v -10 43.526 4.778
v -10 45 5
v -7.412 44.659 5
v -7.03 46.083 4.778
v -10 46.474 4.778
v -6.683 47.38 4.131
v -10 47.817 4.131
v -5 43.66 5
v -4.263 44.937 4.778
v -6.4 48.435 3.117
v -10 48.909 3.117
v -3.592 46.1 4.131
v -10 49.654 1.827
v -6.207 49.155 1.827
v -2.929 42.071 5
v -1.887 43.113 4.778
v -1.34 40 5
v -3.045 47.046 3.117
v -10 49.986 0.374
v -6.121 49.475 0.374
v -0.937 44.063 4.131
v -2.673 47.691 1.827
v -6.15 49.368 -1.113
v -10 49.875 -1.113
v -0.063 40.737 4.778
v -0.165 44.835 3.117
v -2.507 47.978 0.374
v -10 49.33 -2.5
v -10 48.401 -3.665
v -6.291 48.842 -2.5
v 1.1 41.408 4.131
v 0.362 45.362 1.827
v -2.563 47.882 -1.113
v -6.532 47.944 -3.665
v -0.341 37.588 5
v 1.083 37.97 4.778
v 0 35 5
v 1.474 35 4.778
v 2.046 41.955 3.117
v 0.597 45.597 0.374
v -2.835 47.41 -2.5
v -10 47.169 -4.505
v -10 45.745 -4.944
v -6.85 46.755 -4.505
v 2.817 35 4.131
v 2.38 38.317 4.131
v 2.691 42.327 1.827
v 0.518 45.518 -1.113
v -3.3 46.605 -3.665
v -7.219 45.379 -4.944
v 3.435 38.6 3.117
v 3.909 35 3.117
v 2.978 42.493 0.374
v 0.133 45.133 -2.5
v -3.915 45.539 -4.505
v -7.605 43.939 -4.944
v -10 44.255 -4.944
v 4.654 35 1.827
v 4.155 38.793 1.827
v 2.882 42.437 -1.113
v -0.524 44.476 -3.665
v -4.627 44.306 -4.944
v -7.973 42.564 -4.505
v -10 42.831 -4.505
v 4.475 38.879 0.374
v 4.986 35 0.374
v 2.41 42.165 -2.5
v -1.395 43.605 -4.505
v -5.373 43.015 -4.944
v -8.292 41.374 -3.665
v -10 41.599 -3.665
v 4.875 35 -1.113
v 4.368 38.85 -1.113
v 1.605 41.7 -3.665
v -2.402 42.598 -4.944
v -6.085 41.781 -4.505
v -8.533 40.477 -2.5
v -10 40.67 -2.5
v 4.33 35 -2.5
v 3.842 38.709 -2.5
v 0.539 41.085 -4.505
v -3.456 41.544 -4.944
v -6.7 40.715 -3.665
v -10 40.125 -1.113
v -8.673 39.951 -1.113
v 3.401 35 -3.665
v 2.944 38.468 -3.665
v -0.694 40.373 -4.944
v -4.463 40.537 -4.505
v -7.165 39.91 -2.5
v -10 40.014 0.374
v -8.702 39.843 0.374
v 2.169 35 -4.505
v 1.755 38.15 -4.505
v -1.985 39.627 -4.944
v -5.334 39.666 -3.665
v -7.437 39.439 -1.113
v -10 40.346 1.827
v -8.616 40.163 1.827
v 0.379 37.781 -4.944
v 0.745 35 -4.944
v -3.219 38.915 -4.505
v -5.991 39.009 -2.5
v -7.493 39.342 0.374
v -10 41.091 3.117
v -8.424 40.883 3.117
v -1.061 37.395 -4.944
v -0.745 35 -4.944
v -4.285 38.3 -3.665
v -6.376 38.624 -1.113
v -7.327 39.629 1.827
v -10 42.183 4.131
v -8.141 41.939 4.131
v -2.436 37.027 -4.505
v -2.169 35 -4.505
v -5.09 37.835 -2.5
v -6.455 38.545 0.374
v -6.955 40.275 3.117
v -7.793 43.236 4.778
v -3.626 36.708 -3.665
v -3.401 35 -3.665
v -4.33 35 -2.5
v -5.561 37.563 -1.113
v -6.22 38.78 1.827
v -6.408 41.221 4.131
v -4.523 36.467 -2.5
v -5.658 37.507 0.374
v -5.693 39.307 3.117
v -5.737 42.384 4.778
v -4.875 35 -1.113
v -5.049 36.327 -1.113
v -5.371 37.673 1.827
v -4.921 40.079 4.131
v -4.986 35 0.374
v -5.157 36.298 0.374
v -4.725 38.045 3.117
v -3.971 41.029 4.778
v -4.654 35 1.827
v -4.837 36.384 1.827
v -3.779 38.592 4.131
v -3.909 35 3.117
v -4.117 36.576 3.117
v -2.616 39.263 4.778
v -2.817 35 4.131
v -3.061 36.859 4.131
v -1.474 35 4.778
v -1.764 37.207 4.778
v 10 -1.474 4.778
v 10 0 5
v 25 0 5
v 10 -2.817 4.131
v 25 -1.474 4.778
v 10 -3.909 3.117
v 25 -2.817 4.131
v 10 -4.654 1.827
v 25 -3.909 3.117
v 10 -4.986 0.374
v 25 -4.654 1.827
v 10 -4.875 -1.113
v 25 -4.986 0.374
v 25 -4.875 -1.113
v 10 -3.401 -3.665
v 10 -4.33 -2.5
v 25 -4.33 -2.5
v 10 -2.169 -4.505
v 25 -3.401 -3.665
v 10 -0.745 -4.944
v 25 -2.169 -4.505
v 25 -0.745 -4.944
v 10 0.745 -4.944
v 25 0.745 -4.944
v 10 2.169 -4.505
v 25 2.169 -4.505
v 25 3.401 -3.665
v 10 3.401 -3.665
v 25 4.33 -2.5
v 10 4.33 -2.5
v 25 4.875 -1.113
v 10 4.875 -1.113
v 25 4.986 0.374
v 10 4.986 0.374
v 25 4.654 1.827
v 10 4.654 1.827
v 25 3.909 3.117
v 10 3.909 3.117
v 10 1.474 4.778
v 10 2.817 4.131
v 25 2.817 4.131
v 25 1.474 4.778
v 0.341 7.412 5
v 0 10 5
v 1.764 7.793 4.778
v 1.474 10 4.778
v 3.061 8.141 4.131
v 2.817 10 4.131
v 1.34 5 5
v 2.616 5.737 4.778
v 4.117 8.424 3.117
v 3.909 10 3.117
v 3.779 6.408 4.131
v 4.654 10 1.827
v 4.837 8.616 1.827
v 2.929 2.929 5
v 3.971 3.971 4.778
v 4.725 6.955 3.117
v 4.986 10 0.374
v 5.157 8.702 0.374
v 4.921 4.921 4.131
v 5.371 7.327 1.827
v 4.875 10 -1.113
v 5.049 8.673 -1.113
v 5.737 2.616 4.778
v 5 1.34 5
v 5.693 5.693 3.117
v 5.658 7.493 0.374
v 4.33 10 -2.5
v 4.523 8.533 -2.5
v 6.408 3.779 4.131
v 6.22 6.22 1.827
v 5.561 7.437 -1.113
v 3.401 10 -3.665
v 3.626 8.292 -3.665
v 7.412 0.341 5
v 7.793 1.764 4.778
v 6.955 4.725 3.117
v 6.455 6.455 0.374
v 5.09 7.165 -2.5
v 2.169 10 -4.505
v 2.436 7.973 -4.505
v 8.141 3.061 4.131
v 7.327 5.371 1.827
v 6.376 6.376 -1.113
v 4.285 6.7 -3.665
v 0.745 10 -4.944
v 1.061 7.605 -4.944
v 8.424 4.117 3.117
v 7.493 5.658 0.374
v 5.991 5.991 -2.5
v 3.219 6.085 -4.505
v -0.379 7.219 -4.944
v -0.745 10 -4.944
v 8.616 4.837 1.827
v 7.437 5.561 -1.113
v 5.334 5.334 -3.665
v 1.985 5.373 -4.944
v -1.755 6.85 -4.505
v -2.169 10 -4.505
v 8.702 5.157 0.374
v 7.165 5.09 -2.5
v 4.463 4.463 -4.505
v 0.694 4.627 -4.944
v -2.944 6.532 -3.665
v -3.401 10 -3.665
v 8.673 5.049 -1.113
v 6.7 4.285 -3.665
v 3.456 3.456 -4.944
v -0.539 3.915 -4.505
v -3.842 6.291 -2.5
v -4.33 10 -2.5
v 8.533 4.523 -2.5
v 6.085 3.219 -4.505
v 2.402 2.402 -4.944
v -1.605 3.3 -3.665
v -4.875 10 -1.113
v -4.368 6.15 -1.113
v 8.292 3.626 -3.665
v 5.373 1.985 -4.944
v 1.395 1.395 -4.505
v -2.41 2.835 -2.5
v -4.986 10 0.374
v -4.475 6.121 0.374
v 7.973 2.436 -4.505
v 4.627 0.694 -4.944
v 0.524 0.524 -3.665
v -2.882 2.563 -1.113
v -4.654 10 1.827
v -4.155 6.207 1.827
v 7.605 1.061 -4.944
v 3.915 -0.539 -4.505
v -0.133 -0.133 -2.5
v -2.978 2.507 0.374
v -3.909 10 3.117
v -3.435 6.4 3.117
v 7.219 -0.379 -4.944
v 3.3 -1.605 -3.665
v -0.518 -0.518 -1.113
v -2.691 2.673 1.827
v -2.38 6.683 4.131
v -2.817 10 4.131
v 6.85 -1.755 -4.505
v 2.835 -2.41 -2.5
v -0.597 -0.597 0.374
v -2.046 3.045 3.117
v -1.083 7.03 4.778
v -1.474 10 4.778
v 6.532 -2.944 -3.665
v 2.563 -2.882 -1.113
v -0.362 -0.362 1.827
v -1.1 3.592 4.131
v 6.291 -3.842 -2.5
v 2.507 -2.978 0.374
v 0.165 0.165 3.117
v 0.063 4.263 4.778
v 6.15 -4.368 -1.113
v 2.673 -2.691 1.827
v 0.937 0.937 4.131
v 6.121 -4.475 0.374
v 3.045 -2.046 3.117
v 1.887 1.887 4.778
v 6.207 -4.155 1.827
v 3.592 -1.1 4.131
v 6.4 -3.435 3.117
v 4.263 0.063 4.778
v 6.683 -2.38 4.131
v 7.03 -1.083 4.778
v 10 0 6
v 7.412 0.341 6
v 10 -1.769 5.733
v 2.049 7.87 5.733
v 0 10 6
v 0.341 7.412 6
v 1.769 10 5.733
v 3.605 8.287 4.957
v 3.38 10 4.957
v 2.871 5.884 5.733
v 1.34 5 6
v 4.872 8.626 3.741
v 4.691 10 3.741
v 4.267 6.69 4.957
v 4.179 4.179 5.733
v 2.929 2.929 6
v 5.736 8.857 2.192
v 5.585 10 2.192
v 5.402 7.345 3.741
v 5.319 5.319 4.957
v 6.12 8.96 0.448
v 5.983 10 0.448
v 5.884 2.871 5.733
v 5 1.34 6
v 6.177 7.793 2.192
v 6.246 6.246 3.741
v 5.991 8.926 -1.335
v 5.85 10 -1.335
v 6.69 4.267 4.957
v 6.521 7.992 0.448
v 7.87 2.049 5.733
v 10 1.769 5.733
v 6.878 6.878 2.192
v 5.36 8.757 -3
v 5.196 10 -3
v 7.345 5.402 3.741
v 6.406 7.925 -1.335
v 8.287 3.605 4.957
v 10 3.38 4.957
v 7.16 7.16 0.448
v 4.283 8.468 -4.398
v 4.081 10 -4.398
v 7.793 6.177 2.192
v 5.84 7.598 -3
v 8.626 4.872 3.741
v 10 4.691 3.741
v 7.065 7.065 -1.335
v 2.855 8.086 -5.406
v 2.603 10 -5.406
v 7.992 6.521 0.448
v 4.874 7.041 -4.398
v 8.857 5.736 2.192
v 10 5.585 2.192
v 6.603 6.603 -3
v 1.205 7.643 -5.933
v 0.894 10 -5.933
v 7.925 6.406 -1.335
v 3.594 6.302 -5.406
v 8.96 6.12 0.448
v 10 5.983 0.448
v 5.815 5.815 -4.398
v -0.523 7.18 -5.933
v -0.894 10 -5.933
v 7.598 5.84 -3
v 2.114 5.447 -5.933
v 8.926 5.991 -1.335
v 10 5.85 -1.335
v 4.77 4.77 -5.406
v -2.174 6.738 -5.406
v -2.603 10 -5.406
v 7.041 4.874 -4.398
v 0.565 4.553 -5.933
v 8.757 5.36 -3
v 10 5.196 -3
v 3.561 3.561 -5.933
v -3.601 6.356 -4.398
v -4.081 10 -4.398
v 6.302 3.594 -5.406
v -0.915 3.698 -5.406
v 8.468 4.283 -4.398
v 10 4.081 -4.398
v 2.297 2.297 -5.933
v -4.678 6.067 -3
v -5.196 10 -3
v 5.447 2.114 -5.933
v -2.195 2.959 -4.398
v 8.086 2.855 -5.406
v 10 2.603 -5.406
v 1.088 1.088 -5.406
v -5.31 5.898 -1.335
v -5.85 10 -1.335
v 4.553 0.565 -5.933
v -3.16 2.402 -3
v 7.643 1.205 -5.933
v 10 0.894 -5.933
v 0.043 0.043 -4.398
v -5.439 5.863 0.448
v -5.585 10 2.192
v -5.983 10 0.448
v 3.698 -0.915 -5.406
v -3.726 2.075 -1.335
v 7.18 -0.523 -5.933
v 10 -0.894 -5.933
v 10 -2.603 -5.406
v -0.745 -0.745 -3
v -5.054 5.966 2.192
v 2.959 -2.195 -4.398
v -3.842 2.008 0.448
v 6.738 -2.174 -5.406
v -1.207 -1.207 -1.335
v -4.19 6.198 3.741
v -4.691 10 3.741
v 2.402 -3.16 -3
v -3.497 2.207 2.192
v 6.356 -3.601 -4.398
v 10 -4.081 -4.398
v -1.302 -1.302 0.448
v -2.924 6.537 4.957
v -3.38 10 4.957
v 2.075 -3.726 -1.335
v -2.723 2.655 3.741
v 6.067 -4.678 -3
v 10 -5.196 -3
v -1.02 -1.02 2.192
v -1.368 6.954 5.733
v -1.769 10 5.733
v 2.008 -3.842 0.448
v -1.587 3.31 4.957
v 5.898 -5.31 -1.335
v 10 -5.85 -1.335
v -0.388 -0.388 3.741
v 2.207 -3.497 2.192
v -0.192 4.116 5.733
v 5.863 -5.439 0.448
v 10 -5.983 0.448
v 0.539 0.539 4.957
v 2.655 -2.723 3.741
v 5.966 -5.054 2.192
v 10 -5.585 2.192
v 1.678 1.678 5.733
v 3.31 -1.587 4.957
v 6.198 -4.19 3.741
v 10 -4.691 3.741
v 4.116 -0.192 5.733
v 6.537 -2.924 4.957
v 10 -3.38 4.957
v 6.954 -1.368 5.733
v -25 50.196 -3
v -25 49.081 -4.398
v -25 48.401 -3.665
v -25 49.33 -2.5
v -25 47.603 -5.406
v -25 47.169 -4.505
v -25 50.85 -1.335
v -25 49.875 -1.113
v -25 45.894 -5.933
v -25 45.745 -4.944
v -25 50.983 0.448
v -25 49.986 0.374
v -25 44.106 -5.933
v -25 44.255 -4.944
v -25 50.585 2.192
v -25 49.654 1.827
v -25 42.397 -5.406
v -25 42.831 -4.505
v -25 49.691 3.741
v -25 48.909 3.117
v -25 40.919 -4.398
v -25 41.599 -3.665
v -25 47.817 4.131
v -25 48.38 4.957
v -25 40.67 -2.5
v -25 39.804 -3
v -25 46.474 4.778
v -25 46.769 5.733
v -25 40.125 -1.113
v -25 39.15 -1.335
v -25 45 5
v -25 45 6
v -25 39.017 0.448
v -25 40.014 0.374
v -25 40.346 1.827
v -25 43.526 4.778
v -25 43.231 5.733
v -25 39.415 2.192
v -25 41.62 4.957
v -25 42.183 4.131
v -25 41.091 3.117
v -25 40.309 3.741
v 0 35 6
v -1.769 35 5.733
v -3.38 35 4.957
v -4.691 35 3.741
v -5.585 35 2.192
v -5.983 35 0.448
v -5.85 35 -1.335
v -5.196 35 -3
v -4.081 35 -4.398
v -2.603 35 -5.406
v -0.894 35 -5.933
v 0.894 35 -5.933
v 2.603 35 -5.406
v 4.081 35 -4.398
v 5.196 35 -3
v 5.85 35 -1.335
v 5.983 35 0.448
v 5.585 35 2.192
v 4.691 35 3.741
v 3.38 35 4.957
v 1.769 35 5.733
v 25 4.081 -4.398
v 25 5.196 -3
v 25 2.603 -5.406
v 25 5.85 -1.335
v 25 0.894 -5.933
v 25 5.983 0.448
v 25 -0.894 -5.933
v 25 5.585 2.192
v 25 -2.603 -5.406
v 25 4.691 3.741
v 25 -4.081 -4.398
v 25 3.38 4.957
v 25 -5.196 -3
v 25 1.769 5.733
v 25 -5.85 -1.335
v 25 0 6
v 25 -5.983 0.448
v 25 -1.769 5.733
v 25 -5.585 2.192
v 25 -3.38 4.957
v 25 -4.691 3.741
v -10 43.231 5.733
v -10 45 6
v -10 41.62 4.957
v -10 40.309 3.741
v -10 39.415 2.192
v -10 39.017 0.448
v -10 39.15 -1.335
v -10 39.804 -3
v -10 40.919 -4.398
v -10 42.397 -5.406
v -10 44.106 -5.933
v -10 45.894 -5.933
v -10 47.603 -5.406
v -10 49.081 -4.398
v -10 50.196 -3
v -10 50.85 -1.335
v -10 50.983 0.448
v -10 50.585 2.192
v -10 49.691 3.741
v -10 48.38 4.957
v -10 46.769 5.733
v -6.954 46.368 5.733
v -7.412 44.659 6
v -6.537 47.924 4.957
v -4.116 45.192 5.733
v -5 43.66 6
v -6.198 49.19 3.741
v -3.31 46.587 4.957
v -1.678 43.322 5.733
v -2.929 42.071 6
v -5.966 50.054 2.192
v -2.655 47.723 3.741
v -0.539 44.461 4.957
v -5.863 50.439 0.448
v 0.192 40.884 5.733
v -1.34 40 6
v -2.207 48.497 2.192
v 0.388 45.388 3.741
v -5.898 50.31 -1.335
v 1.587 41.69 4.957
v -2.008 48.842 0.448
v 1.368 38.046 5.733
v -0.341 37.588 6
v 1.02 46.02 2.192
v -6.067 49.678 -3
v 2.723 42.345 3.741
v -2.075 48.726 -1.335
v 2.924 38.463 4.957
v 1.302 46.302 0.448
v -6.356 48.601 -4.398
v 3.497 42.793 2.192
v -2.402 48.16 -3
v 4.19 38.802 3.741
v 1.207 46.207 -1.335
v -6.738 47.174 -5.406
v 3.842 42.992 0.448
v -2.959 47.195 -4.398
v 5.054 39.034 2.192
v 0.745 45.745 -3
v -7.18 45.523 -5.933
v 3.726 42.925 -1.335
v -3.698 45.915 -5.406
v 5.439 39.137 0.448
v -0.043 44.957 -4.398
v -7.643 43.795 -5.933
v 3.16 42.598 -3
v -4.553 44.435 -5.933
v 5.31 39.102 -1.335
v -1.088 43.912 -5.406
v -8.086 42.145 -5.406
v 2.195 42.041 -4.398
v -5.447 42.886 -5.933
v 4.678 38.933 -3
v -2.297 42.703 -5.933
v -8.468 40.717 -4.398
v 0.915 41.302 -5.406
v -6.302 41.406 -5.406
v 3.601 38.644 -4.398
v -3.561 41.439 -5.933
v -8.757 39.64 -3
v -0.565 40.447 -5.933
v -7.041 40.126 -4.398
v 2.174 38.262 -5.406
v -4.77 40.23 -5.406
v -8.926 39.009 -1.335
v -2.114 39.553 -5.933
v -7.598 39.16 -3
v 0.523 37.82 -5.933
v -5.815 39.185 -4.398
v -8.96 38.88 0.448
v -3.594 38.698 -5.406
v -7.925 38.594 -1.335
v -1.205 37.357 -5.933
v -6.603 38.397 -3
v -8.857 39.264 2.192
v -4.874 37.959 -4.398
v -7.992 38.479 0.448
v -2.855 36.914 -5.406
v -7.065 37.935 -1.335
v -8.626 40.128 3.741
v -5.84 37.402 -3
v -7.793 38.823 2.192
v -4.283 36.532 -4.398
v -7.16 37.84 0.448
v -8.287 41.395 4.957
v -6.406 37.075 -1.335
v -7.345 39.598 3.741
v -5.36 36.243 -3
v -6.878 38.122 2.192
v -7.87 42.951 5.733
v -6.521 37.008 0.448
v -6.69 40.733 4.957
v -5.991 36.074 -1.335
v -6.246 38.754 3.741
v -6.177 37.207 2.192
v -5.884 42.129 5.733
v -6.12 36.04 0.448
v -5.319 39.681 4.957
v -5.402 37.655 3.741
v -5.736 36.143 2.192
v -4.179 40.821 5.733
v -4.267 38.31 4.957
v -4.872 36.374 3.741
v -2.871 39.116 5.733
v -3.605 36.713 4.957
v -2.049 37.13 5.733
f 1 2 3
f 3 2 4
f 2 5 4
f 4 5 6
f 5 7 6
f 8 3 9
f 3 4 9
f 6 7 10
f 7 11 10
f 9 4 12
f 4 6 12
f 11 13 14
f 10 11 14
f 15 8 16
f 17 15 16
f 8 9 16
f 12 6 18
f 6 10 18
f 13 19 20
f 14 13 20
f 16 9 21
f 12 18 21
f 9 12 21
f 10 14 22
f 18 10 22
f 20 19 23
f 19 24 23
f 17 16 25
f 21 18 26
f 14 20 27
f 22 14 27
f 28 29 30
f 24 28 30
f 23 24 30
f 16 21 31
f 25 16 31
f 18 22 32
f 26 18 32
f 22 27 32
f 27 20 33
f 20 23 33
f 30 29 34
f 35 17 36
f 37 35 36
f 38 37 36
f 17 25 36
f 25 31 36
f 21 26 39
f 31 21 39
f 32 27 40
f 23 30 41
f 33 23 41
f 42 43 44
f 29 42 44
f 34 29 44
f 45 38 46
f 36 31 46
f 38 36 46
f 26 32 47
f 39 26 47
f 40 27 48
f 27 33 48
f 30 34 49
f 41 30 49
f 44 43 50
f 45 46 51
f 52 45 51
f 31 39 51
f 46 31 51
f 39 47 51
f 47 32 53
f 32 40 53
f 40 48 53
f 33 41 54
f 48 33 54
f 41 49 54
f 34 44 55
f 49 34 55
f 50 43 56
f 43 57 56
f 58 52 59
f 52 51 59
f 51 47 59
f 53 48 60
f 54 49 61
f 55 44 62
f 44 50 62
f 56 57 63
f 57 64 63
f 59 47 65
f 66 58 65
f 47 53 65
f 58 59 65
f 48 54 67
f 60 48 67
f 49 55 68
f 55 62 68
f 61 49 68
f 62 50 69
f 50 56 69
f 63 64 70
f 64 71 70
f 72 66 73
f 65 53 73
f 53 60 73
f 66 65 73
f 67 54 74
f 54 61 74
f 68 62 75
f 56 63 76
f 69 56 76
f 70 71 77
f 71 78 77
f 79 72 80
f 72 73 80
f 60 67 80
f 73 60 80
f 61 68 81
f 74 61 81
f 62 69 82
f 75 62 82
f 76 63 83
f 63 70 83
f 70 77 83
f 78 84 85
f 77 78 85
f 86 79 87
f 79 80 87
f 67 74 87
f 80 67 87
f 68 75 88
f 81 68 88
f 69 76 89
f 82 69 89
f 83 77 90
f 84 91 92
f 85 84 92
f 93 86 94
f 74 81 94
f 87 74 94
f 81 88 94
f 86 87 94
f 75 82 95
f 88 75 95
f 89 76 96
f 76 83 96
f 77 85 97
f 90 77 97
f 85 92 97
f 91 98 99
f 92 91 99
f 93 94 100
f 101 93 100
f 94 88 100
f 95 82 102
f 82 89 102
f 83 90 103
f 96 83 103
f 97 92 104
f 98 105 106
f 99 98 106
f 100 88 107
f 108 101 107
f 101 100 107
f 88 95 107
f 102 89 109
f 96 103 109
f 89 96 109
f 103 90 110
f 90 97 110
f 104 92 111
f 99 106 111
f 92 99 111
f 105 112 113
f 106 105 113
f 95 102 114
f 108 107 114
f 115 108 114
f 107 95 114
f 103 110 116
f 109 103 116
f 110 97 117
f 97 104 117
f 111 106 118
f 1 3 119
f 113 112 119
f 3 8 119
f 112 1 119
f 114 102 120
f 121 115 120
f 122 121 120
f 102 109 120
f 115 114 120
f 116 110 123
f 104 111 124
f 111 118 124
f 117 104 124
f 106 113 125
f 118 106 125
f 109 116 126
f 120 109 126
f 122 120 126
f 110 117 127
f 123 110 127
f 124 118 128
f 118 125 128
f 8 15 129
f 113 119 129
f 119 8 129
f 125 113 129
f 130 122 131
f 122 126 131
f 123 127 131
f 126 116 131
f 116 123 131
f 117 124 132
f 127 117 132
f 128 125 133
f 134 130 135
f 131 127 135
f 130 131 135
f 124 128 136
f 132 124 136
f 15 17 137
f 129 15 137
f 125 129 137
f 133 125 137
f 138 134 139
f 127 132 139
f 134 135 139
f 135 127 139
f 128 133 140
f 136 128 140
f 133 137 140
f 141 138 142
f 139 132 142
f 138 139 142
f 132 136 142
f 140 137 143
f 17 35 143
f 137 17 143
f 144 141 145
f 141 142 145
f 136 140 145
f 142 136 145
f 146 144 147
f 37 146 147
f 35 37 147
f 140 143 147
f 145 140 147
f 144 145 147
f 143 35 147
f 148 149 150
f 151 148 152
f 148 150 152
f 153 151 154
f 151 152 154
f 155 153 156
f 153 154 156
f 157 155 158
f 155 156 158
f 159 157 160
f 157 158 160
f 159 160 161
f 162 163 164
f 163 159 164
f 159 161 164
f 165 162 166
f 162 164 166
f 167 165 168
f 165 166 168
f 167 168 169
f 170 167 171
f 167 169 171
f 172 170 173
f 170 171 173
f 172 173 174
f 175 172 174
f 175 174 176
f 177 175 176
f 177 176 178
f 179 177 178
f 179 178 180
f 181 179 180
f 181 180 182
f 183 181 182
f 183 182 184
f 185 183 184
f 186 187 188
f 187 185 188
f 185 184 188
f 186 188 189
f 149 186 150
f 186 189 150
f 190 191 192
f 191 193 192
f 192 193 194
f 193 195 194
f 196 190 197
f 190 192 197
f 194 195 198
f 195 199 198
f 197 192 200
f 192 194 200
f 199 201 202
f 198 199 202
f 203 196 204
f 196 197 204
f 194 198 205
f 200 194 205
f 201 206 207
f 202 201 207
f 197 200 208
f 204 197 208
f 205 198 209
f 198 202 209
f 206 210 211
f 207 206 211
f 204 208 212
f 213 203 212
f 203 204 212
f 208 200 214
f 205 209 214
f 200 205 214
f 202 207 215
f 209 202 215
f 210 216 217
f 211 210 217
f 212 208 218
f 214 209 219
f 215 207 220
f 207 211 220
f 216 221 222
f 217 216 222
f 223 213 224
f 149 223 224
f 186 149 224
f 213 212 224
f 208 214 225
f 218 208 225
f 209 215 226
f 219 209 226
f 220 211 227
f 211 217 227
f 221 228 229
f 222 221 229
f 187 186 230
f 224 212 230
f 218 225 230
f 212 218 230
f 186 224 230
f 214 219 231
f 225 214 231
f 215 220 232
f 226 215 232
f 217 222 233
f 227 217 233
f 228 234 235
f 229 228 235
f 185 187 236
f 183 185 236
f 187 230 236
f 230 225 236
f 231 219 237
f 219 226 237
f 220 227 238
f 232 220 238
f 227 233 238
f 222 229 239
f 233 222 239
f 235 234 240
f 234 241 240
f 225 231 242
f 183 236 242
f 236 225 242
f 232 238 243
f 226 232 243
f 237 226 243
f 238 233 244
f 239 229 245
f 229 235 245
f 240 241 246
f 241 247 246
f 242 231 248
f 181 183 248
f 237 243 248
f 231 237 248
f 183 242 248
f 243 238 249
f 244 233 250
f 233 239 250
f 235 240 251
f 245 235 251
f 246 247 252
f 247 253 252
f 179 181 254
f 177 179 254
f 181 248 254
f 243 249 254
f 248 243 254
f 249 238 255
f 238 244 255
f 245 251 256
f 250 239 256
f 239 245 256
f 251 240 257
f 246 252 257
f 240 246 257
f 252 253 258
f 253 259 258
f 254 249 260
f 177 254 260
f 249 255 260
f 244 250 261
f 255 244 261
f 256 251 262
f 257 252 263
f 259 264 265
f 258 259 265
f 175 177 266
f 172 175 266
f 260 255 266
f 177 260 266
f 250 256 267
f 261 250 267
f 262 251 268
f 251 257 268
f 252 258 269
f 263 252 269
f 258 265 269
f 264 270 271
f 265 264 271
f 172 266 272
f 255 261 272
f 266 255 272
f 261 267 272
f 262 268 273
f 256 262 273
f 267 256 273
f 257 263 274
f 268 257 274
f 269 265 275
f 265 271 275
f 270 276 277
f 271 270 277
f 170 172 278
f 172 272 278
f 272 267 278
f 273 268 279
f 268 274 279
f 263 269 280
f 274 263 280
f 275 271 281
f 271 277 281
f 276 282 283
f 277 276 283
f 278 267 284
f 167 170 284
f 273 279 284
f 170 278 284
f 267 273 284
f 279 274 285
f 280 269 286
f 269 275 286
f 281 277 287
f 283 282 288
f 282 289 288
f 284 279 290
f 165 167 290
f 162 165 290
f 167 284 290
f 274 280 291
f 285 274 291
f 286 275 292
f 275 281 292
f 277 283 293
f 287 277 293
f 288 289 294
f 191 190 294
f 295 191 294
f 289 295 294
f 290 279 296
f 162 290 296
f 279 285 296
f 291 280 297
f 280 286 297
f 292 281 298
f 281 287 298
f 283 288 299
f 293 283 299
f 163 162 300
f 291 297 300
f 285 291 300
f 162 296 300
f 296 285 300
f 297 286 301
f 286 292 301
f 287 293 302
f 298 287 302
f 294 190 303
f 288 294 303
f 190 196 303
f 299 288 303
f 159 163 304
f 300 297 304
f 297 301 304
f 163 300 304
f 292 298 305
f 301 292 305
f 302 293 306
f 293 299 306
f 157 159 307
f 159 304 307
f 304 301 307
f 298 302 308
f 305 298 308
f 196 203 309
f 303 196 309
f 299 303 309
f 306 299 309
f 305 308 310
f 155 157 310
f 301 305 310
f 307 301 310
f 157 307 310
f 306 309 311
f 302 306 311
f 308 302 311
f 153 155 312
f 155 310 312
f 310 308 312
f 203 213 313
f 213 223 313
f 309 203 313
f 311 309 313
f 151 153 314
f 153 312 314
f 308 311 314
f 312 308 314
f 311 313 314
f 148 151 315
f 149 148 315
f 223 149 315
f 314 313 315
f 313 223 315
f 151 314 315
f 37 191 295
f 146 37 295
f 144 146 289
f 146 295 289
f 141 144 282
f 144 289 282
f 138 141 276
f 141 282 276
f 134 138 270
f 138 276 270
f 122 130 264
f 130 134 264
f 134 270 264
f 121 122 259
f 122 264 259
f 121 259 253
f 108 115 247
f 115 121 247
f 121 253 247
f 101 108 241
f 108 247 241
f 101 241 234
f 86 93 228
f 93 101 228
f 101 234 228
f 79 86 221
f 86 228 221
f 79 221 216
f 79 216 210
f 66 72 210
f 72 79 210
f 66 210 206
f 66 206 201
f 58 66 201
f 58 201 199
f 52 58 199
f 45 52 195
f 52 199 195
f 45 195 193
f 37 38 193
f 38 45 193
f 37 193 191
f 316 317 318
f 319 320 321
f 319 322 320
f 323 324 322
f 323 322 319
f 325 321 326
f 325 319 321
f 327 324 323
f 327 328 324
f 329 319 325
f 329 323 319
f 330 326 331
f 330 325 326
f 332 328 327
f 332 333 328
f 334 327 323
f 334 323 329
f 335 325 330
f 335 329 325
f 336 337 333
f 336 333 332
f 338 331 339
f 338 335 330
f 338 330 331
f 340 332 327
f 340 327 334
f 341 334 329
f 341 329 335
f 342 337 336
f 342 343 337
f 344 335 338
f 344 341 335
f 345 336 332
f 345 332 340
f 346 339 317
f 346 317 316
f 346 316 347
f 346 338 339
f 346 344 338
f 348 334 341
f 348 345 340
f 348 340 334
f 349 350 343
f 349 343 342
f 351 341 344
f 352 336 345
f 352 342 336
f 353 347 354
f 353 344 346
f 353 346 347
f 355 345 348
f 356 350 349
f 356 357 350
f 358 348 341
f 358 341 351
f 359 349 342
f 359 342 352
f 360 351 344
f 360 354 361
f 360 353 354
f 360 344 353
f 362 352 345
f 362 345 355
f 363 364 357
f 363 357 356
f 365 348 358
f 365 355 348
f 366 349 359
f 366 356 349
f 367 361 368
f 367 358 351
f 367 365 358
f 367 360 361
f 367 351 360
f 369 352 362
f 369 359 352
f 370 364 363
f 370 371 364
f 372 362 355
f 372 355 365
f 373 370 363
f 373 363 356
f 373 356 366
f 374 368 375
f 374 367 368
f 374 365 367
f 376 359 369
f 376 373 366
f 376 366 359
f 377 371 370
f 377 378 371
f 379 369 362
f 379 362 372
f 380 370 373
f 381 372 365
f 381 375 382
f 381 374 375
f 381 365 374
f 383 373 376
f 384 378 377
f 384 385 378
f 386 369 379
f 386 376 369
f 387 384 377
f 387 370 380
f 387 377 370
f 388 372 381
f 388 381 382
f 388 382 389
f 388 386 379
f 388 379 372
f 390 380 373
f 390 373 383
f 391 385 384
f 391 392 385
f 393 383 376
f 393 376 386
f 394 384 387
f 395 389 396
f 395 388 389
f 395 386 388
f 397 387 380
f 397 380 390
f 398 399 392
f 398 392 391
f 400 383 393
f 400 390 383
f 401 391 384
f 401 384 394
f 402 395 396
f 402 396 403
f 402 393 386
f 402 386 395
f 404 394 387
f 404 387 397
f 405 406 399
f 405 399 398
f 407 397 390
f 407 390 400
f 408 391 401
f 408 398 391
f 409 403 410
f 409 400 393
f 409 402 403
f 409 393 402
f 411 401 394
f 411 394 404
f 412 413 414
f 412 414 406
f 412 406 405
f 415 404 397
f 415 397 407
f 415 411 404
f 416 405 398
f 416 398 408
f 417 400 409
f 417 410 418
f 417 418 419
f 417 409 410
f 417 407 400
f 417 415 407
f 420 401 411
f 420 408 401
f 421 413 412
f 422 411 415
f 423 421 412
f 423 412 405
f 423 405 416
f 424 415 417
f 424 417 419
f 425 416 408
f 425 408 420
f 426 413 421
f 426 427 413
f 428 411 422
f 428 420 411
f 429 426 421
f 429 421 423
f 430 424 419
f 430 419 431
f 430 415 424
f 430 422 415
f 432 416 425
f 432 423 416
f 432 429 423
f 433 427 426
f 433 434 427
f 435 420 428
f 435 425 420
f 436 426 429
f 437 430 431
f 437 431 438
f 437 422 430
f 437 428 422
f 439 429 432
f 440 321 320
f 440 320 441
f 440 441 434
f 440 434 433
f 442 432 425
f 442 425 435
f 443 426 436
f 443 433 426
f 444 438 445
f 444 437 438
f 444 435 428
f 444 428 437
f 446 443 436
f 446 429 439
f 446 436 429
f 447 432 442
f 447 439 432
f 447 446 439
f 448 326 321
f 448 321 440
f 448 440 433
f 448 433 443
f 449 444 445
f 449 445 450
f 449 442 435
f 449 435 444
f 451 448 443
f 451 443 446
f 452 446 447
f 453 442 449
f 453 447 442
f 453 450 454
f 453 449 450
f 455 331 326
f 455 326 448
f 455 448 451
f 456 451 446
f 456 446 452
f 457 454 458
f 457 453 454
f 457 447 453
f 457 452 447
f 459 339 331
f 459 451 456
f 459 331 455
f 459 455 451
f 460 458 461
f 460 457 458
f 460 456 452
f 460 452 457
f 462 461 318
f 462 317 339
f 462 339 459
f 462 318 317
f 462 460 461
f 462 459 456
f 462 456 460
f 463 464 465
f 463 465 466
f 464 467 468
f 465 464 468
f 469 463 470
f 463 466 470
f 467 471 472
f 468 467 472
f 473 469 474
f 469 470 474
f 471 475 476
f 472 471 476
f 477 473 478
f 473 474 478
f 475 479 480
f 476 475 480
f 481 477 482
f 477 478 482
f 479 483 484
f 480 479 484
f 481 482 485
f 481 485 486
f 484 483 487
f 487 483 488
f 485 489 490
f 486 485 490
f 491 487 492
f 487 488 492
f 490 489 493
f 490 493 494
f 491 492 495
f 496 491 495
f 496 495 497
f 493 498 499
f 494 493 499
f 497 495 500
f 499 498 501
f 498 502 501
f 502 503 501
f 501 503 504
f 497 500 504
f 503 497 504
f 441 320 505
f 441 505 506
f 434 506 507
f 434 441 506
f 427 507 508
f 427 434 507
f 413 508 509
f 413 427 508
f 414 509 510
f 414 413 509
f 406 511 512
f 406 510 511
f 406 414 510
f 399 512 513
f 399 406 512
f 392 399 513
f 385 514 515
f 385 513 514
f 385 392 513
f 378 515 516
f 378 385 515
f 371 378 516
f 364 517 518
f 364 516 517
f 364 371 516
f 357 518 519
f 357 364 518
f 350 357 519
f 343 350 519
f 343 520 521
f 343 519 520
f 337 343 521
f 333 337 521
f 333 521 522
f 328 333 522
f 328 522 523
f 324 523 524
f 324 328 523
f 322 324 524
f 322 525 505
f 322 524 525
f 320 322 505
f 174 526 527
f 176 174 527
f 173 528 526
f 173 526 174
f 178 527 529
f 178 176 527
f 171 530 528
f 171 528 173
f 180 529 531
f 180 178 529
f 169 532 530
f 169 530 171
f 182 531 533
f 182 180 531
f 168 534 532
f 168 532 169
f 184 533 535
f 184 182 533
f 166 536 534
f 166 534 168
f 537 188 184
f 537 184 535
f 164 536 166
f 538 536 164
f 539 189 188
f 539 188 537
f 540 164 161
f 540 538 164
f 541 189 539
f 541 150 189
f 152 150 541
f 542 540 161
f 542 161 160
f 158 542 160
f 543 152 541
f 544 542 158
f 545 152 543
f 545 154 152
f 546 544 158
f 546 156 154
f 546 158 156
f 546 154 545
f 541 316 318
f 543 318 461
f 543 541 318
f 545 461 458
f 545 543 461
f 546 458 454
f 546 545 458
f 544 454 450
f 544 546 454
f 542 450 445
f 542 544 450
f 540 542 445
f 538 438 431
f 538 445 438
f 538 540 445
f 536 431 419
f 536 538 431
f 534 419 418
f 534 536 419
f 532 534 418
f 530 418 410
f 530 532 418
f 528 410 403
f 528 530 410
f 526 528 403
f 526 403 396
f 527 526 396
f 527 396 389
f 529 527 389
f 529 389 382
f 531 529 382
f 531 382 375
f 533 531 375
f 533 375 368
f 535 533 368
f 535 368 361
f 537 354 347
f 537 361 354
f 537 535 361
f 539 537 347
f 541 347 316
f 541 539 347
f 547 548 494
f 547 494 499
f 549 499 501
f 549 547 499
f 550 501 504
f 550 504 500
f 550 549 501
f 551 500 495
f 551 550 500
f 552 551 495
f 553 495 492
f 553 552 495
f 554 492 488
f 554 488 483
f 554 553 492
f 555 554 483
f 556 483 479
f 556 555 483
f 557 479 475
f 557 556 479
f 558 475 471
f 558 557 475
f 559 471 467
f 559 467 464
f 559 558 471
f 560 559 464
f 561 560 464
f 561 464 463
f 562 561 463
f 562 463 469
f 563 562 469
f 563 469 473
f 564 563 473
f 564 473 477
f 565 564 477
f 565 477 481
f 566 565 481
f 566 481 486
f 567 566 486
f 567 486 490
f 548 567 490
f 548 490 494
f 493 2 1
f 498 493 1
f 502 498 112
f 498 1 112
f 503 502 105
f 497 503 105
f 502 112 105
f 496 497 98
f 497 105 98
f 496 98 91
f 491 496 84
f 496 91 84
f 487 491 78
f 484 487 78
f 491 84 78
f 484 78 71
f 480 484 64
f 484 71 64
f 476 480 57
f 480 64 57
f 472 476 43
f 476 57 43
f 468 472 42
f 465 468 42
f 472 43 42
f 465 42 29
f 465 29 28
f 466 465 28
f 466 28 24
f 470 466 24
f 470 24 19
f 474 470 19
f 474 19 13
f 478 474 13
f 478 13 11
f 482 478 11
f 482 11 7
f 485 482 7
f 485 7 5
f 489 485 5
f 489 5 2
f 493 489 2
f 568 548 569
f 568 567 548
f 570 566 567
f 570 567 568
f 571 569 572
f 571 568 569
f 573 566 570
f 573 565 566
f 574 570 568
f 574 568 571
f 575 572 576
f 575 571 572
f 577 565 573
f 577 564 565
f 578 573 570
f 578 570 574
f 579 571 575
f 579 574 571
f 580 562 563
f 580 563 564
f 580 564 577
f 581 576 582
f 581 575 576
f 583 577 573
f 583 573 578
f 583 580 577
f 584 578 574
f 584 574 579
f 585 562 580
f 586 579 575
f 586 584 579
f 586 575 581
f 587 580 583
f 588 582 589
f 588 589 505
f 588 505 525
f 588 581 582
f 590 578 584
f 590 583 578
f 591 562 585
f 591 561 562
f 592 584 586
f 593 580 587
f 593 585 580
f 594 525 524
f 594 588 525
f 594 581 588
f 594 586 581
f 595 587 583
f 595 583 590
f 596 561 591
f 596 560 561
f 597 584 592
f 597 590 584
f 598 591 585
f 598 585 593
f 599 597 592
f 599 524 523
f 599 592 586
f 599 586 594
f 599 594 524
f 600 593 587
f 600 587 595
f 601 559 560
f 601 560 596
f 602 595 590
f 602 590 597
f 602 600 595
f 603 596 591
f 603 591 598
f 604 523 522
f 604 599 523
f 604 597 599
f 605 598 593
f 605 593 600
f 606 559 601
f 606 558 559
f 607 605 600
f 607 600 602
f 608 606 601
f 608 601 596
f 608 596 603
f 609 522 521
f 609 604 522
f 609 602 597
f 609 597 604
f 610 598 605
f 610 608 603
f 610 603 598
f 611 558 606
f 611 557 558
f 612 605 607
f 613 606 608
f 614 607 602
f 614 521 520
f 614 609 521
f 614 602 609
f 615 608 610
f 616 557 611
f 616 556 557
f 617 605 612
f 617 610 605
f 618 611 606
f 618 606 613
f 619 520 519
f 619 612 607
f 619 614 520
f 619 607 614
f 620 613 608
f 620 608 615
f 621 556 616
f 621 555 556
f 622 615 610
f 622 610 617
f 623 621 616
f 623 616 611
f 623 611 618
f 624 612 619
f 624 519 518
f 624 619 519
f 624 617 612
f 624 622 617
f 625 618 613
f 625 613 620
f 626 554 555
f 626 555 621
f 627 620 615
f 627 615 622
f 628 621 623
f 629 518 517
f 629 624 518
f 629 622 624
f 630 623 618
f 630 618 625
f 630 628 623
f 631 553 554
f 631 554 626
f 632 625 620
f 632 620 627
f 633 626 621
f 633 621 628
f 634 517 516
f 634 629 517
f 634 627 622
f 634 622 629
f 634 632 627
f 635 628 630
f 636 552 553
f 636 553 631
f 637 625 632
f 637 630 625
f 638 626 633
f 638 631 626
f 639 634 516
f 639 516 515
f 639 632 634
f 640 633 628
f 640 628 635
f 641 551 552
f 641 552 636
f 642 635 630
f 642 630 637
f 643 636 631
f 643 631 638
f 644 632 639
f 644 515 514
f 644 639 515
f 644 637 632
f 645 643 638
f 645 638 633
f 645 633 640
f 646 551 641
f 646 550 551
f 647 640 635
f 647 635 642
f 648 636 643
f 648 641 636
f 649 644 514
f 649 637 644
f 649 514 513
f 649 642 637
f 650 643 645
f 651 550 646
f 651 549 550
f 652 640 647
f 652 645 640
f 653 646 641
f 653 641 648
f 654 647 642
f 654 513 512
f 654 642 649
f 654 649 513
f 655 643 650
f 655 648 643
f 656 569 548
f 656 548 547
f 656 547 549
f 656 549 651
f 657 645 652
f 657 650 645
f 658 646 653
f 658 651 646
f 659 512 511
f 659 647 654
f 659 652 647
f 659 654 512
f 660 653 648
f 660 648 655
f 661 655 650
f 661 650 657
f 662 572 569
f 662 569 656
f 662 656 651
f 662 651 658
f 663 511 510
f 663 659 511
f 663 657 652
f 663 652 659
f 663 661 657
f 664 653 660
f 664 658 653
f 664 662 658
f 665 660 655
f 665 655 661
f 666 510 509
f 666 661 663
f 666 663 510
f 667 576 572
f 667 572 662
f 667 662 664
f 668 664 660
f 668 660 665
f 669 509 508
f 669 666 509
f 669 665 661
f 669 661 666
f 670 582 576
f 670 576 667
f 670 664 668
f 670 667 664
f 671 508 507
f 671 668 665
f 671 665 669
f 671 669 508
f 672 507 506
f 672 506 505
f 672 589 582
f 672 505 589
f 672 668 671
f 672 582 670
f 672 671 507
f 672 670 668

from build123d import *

# Parameters (mm, degrees)
SWEEP_THIN1_PROFILE_R   = 6
SWEEP_THIN1_PROFILE_R_2 = 5


with BuildPart() as part:
    # Sweep-Thin1: sweep along a path in Sketch1
    with BuildLine(Plane.XY) as sweep_thin1_path:
        Line((-25, 45), (-10, 45))
        ThreePointArc((-10, 45), (-2.928932188, 42.071067812), (0, 35))
        Line((0, 35), (0, 10))
        ThreePointArc((0, 10), (2.928932188, 2.928932188), (10, 0))
        Line((10, 0), (25, 0))
    # Sweep-Thin1 profile (on start of the path) → Sweep-Thin1 (sweep)
    with BuildSketch(Plane(origin=(-25, 45, 0), x_dir=(0, 0, 1), z_dir=(1, 0, 0))):
        Circle(SWEEP_THIN1_PROFILE_R)
        Circle(SWEEP_THIN1_PROFILE_R_2, mode=Mode.SUBTRACT)
    sweep(path=sweep_thin1_path.line)


solid = part.part
